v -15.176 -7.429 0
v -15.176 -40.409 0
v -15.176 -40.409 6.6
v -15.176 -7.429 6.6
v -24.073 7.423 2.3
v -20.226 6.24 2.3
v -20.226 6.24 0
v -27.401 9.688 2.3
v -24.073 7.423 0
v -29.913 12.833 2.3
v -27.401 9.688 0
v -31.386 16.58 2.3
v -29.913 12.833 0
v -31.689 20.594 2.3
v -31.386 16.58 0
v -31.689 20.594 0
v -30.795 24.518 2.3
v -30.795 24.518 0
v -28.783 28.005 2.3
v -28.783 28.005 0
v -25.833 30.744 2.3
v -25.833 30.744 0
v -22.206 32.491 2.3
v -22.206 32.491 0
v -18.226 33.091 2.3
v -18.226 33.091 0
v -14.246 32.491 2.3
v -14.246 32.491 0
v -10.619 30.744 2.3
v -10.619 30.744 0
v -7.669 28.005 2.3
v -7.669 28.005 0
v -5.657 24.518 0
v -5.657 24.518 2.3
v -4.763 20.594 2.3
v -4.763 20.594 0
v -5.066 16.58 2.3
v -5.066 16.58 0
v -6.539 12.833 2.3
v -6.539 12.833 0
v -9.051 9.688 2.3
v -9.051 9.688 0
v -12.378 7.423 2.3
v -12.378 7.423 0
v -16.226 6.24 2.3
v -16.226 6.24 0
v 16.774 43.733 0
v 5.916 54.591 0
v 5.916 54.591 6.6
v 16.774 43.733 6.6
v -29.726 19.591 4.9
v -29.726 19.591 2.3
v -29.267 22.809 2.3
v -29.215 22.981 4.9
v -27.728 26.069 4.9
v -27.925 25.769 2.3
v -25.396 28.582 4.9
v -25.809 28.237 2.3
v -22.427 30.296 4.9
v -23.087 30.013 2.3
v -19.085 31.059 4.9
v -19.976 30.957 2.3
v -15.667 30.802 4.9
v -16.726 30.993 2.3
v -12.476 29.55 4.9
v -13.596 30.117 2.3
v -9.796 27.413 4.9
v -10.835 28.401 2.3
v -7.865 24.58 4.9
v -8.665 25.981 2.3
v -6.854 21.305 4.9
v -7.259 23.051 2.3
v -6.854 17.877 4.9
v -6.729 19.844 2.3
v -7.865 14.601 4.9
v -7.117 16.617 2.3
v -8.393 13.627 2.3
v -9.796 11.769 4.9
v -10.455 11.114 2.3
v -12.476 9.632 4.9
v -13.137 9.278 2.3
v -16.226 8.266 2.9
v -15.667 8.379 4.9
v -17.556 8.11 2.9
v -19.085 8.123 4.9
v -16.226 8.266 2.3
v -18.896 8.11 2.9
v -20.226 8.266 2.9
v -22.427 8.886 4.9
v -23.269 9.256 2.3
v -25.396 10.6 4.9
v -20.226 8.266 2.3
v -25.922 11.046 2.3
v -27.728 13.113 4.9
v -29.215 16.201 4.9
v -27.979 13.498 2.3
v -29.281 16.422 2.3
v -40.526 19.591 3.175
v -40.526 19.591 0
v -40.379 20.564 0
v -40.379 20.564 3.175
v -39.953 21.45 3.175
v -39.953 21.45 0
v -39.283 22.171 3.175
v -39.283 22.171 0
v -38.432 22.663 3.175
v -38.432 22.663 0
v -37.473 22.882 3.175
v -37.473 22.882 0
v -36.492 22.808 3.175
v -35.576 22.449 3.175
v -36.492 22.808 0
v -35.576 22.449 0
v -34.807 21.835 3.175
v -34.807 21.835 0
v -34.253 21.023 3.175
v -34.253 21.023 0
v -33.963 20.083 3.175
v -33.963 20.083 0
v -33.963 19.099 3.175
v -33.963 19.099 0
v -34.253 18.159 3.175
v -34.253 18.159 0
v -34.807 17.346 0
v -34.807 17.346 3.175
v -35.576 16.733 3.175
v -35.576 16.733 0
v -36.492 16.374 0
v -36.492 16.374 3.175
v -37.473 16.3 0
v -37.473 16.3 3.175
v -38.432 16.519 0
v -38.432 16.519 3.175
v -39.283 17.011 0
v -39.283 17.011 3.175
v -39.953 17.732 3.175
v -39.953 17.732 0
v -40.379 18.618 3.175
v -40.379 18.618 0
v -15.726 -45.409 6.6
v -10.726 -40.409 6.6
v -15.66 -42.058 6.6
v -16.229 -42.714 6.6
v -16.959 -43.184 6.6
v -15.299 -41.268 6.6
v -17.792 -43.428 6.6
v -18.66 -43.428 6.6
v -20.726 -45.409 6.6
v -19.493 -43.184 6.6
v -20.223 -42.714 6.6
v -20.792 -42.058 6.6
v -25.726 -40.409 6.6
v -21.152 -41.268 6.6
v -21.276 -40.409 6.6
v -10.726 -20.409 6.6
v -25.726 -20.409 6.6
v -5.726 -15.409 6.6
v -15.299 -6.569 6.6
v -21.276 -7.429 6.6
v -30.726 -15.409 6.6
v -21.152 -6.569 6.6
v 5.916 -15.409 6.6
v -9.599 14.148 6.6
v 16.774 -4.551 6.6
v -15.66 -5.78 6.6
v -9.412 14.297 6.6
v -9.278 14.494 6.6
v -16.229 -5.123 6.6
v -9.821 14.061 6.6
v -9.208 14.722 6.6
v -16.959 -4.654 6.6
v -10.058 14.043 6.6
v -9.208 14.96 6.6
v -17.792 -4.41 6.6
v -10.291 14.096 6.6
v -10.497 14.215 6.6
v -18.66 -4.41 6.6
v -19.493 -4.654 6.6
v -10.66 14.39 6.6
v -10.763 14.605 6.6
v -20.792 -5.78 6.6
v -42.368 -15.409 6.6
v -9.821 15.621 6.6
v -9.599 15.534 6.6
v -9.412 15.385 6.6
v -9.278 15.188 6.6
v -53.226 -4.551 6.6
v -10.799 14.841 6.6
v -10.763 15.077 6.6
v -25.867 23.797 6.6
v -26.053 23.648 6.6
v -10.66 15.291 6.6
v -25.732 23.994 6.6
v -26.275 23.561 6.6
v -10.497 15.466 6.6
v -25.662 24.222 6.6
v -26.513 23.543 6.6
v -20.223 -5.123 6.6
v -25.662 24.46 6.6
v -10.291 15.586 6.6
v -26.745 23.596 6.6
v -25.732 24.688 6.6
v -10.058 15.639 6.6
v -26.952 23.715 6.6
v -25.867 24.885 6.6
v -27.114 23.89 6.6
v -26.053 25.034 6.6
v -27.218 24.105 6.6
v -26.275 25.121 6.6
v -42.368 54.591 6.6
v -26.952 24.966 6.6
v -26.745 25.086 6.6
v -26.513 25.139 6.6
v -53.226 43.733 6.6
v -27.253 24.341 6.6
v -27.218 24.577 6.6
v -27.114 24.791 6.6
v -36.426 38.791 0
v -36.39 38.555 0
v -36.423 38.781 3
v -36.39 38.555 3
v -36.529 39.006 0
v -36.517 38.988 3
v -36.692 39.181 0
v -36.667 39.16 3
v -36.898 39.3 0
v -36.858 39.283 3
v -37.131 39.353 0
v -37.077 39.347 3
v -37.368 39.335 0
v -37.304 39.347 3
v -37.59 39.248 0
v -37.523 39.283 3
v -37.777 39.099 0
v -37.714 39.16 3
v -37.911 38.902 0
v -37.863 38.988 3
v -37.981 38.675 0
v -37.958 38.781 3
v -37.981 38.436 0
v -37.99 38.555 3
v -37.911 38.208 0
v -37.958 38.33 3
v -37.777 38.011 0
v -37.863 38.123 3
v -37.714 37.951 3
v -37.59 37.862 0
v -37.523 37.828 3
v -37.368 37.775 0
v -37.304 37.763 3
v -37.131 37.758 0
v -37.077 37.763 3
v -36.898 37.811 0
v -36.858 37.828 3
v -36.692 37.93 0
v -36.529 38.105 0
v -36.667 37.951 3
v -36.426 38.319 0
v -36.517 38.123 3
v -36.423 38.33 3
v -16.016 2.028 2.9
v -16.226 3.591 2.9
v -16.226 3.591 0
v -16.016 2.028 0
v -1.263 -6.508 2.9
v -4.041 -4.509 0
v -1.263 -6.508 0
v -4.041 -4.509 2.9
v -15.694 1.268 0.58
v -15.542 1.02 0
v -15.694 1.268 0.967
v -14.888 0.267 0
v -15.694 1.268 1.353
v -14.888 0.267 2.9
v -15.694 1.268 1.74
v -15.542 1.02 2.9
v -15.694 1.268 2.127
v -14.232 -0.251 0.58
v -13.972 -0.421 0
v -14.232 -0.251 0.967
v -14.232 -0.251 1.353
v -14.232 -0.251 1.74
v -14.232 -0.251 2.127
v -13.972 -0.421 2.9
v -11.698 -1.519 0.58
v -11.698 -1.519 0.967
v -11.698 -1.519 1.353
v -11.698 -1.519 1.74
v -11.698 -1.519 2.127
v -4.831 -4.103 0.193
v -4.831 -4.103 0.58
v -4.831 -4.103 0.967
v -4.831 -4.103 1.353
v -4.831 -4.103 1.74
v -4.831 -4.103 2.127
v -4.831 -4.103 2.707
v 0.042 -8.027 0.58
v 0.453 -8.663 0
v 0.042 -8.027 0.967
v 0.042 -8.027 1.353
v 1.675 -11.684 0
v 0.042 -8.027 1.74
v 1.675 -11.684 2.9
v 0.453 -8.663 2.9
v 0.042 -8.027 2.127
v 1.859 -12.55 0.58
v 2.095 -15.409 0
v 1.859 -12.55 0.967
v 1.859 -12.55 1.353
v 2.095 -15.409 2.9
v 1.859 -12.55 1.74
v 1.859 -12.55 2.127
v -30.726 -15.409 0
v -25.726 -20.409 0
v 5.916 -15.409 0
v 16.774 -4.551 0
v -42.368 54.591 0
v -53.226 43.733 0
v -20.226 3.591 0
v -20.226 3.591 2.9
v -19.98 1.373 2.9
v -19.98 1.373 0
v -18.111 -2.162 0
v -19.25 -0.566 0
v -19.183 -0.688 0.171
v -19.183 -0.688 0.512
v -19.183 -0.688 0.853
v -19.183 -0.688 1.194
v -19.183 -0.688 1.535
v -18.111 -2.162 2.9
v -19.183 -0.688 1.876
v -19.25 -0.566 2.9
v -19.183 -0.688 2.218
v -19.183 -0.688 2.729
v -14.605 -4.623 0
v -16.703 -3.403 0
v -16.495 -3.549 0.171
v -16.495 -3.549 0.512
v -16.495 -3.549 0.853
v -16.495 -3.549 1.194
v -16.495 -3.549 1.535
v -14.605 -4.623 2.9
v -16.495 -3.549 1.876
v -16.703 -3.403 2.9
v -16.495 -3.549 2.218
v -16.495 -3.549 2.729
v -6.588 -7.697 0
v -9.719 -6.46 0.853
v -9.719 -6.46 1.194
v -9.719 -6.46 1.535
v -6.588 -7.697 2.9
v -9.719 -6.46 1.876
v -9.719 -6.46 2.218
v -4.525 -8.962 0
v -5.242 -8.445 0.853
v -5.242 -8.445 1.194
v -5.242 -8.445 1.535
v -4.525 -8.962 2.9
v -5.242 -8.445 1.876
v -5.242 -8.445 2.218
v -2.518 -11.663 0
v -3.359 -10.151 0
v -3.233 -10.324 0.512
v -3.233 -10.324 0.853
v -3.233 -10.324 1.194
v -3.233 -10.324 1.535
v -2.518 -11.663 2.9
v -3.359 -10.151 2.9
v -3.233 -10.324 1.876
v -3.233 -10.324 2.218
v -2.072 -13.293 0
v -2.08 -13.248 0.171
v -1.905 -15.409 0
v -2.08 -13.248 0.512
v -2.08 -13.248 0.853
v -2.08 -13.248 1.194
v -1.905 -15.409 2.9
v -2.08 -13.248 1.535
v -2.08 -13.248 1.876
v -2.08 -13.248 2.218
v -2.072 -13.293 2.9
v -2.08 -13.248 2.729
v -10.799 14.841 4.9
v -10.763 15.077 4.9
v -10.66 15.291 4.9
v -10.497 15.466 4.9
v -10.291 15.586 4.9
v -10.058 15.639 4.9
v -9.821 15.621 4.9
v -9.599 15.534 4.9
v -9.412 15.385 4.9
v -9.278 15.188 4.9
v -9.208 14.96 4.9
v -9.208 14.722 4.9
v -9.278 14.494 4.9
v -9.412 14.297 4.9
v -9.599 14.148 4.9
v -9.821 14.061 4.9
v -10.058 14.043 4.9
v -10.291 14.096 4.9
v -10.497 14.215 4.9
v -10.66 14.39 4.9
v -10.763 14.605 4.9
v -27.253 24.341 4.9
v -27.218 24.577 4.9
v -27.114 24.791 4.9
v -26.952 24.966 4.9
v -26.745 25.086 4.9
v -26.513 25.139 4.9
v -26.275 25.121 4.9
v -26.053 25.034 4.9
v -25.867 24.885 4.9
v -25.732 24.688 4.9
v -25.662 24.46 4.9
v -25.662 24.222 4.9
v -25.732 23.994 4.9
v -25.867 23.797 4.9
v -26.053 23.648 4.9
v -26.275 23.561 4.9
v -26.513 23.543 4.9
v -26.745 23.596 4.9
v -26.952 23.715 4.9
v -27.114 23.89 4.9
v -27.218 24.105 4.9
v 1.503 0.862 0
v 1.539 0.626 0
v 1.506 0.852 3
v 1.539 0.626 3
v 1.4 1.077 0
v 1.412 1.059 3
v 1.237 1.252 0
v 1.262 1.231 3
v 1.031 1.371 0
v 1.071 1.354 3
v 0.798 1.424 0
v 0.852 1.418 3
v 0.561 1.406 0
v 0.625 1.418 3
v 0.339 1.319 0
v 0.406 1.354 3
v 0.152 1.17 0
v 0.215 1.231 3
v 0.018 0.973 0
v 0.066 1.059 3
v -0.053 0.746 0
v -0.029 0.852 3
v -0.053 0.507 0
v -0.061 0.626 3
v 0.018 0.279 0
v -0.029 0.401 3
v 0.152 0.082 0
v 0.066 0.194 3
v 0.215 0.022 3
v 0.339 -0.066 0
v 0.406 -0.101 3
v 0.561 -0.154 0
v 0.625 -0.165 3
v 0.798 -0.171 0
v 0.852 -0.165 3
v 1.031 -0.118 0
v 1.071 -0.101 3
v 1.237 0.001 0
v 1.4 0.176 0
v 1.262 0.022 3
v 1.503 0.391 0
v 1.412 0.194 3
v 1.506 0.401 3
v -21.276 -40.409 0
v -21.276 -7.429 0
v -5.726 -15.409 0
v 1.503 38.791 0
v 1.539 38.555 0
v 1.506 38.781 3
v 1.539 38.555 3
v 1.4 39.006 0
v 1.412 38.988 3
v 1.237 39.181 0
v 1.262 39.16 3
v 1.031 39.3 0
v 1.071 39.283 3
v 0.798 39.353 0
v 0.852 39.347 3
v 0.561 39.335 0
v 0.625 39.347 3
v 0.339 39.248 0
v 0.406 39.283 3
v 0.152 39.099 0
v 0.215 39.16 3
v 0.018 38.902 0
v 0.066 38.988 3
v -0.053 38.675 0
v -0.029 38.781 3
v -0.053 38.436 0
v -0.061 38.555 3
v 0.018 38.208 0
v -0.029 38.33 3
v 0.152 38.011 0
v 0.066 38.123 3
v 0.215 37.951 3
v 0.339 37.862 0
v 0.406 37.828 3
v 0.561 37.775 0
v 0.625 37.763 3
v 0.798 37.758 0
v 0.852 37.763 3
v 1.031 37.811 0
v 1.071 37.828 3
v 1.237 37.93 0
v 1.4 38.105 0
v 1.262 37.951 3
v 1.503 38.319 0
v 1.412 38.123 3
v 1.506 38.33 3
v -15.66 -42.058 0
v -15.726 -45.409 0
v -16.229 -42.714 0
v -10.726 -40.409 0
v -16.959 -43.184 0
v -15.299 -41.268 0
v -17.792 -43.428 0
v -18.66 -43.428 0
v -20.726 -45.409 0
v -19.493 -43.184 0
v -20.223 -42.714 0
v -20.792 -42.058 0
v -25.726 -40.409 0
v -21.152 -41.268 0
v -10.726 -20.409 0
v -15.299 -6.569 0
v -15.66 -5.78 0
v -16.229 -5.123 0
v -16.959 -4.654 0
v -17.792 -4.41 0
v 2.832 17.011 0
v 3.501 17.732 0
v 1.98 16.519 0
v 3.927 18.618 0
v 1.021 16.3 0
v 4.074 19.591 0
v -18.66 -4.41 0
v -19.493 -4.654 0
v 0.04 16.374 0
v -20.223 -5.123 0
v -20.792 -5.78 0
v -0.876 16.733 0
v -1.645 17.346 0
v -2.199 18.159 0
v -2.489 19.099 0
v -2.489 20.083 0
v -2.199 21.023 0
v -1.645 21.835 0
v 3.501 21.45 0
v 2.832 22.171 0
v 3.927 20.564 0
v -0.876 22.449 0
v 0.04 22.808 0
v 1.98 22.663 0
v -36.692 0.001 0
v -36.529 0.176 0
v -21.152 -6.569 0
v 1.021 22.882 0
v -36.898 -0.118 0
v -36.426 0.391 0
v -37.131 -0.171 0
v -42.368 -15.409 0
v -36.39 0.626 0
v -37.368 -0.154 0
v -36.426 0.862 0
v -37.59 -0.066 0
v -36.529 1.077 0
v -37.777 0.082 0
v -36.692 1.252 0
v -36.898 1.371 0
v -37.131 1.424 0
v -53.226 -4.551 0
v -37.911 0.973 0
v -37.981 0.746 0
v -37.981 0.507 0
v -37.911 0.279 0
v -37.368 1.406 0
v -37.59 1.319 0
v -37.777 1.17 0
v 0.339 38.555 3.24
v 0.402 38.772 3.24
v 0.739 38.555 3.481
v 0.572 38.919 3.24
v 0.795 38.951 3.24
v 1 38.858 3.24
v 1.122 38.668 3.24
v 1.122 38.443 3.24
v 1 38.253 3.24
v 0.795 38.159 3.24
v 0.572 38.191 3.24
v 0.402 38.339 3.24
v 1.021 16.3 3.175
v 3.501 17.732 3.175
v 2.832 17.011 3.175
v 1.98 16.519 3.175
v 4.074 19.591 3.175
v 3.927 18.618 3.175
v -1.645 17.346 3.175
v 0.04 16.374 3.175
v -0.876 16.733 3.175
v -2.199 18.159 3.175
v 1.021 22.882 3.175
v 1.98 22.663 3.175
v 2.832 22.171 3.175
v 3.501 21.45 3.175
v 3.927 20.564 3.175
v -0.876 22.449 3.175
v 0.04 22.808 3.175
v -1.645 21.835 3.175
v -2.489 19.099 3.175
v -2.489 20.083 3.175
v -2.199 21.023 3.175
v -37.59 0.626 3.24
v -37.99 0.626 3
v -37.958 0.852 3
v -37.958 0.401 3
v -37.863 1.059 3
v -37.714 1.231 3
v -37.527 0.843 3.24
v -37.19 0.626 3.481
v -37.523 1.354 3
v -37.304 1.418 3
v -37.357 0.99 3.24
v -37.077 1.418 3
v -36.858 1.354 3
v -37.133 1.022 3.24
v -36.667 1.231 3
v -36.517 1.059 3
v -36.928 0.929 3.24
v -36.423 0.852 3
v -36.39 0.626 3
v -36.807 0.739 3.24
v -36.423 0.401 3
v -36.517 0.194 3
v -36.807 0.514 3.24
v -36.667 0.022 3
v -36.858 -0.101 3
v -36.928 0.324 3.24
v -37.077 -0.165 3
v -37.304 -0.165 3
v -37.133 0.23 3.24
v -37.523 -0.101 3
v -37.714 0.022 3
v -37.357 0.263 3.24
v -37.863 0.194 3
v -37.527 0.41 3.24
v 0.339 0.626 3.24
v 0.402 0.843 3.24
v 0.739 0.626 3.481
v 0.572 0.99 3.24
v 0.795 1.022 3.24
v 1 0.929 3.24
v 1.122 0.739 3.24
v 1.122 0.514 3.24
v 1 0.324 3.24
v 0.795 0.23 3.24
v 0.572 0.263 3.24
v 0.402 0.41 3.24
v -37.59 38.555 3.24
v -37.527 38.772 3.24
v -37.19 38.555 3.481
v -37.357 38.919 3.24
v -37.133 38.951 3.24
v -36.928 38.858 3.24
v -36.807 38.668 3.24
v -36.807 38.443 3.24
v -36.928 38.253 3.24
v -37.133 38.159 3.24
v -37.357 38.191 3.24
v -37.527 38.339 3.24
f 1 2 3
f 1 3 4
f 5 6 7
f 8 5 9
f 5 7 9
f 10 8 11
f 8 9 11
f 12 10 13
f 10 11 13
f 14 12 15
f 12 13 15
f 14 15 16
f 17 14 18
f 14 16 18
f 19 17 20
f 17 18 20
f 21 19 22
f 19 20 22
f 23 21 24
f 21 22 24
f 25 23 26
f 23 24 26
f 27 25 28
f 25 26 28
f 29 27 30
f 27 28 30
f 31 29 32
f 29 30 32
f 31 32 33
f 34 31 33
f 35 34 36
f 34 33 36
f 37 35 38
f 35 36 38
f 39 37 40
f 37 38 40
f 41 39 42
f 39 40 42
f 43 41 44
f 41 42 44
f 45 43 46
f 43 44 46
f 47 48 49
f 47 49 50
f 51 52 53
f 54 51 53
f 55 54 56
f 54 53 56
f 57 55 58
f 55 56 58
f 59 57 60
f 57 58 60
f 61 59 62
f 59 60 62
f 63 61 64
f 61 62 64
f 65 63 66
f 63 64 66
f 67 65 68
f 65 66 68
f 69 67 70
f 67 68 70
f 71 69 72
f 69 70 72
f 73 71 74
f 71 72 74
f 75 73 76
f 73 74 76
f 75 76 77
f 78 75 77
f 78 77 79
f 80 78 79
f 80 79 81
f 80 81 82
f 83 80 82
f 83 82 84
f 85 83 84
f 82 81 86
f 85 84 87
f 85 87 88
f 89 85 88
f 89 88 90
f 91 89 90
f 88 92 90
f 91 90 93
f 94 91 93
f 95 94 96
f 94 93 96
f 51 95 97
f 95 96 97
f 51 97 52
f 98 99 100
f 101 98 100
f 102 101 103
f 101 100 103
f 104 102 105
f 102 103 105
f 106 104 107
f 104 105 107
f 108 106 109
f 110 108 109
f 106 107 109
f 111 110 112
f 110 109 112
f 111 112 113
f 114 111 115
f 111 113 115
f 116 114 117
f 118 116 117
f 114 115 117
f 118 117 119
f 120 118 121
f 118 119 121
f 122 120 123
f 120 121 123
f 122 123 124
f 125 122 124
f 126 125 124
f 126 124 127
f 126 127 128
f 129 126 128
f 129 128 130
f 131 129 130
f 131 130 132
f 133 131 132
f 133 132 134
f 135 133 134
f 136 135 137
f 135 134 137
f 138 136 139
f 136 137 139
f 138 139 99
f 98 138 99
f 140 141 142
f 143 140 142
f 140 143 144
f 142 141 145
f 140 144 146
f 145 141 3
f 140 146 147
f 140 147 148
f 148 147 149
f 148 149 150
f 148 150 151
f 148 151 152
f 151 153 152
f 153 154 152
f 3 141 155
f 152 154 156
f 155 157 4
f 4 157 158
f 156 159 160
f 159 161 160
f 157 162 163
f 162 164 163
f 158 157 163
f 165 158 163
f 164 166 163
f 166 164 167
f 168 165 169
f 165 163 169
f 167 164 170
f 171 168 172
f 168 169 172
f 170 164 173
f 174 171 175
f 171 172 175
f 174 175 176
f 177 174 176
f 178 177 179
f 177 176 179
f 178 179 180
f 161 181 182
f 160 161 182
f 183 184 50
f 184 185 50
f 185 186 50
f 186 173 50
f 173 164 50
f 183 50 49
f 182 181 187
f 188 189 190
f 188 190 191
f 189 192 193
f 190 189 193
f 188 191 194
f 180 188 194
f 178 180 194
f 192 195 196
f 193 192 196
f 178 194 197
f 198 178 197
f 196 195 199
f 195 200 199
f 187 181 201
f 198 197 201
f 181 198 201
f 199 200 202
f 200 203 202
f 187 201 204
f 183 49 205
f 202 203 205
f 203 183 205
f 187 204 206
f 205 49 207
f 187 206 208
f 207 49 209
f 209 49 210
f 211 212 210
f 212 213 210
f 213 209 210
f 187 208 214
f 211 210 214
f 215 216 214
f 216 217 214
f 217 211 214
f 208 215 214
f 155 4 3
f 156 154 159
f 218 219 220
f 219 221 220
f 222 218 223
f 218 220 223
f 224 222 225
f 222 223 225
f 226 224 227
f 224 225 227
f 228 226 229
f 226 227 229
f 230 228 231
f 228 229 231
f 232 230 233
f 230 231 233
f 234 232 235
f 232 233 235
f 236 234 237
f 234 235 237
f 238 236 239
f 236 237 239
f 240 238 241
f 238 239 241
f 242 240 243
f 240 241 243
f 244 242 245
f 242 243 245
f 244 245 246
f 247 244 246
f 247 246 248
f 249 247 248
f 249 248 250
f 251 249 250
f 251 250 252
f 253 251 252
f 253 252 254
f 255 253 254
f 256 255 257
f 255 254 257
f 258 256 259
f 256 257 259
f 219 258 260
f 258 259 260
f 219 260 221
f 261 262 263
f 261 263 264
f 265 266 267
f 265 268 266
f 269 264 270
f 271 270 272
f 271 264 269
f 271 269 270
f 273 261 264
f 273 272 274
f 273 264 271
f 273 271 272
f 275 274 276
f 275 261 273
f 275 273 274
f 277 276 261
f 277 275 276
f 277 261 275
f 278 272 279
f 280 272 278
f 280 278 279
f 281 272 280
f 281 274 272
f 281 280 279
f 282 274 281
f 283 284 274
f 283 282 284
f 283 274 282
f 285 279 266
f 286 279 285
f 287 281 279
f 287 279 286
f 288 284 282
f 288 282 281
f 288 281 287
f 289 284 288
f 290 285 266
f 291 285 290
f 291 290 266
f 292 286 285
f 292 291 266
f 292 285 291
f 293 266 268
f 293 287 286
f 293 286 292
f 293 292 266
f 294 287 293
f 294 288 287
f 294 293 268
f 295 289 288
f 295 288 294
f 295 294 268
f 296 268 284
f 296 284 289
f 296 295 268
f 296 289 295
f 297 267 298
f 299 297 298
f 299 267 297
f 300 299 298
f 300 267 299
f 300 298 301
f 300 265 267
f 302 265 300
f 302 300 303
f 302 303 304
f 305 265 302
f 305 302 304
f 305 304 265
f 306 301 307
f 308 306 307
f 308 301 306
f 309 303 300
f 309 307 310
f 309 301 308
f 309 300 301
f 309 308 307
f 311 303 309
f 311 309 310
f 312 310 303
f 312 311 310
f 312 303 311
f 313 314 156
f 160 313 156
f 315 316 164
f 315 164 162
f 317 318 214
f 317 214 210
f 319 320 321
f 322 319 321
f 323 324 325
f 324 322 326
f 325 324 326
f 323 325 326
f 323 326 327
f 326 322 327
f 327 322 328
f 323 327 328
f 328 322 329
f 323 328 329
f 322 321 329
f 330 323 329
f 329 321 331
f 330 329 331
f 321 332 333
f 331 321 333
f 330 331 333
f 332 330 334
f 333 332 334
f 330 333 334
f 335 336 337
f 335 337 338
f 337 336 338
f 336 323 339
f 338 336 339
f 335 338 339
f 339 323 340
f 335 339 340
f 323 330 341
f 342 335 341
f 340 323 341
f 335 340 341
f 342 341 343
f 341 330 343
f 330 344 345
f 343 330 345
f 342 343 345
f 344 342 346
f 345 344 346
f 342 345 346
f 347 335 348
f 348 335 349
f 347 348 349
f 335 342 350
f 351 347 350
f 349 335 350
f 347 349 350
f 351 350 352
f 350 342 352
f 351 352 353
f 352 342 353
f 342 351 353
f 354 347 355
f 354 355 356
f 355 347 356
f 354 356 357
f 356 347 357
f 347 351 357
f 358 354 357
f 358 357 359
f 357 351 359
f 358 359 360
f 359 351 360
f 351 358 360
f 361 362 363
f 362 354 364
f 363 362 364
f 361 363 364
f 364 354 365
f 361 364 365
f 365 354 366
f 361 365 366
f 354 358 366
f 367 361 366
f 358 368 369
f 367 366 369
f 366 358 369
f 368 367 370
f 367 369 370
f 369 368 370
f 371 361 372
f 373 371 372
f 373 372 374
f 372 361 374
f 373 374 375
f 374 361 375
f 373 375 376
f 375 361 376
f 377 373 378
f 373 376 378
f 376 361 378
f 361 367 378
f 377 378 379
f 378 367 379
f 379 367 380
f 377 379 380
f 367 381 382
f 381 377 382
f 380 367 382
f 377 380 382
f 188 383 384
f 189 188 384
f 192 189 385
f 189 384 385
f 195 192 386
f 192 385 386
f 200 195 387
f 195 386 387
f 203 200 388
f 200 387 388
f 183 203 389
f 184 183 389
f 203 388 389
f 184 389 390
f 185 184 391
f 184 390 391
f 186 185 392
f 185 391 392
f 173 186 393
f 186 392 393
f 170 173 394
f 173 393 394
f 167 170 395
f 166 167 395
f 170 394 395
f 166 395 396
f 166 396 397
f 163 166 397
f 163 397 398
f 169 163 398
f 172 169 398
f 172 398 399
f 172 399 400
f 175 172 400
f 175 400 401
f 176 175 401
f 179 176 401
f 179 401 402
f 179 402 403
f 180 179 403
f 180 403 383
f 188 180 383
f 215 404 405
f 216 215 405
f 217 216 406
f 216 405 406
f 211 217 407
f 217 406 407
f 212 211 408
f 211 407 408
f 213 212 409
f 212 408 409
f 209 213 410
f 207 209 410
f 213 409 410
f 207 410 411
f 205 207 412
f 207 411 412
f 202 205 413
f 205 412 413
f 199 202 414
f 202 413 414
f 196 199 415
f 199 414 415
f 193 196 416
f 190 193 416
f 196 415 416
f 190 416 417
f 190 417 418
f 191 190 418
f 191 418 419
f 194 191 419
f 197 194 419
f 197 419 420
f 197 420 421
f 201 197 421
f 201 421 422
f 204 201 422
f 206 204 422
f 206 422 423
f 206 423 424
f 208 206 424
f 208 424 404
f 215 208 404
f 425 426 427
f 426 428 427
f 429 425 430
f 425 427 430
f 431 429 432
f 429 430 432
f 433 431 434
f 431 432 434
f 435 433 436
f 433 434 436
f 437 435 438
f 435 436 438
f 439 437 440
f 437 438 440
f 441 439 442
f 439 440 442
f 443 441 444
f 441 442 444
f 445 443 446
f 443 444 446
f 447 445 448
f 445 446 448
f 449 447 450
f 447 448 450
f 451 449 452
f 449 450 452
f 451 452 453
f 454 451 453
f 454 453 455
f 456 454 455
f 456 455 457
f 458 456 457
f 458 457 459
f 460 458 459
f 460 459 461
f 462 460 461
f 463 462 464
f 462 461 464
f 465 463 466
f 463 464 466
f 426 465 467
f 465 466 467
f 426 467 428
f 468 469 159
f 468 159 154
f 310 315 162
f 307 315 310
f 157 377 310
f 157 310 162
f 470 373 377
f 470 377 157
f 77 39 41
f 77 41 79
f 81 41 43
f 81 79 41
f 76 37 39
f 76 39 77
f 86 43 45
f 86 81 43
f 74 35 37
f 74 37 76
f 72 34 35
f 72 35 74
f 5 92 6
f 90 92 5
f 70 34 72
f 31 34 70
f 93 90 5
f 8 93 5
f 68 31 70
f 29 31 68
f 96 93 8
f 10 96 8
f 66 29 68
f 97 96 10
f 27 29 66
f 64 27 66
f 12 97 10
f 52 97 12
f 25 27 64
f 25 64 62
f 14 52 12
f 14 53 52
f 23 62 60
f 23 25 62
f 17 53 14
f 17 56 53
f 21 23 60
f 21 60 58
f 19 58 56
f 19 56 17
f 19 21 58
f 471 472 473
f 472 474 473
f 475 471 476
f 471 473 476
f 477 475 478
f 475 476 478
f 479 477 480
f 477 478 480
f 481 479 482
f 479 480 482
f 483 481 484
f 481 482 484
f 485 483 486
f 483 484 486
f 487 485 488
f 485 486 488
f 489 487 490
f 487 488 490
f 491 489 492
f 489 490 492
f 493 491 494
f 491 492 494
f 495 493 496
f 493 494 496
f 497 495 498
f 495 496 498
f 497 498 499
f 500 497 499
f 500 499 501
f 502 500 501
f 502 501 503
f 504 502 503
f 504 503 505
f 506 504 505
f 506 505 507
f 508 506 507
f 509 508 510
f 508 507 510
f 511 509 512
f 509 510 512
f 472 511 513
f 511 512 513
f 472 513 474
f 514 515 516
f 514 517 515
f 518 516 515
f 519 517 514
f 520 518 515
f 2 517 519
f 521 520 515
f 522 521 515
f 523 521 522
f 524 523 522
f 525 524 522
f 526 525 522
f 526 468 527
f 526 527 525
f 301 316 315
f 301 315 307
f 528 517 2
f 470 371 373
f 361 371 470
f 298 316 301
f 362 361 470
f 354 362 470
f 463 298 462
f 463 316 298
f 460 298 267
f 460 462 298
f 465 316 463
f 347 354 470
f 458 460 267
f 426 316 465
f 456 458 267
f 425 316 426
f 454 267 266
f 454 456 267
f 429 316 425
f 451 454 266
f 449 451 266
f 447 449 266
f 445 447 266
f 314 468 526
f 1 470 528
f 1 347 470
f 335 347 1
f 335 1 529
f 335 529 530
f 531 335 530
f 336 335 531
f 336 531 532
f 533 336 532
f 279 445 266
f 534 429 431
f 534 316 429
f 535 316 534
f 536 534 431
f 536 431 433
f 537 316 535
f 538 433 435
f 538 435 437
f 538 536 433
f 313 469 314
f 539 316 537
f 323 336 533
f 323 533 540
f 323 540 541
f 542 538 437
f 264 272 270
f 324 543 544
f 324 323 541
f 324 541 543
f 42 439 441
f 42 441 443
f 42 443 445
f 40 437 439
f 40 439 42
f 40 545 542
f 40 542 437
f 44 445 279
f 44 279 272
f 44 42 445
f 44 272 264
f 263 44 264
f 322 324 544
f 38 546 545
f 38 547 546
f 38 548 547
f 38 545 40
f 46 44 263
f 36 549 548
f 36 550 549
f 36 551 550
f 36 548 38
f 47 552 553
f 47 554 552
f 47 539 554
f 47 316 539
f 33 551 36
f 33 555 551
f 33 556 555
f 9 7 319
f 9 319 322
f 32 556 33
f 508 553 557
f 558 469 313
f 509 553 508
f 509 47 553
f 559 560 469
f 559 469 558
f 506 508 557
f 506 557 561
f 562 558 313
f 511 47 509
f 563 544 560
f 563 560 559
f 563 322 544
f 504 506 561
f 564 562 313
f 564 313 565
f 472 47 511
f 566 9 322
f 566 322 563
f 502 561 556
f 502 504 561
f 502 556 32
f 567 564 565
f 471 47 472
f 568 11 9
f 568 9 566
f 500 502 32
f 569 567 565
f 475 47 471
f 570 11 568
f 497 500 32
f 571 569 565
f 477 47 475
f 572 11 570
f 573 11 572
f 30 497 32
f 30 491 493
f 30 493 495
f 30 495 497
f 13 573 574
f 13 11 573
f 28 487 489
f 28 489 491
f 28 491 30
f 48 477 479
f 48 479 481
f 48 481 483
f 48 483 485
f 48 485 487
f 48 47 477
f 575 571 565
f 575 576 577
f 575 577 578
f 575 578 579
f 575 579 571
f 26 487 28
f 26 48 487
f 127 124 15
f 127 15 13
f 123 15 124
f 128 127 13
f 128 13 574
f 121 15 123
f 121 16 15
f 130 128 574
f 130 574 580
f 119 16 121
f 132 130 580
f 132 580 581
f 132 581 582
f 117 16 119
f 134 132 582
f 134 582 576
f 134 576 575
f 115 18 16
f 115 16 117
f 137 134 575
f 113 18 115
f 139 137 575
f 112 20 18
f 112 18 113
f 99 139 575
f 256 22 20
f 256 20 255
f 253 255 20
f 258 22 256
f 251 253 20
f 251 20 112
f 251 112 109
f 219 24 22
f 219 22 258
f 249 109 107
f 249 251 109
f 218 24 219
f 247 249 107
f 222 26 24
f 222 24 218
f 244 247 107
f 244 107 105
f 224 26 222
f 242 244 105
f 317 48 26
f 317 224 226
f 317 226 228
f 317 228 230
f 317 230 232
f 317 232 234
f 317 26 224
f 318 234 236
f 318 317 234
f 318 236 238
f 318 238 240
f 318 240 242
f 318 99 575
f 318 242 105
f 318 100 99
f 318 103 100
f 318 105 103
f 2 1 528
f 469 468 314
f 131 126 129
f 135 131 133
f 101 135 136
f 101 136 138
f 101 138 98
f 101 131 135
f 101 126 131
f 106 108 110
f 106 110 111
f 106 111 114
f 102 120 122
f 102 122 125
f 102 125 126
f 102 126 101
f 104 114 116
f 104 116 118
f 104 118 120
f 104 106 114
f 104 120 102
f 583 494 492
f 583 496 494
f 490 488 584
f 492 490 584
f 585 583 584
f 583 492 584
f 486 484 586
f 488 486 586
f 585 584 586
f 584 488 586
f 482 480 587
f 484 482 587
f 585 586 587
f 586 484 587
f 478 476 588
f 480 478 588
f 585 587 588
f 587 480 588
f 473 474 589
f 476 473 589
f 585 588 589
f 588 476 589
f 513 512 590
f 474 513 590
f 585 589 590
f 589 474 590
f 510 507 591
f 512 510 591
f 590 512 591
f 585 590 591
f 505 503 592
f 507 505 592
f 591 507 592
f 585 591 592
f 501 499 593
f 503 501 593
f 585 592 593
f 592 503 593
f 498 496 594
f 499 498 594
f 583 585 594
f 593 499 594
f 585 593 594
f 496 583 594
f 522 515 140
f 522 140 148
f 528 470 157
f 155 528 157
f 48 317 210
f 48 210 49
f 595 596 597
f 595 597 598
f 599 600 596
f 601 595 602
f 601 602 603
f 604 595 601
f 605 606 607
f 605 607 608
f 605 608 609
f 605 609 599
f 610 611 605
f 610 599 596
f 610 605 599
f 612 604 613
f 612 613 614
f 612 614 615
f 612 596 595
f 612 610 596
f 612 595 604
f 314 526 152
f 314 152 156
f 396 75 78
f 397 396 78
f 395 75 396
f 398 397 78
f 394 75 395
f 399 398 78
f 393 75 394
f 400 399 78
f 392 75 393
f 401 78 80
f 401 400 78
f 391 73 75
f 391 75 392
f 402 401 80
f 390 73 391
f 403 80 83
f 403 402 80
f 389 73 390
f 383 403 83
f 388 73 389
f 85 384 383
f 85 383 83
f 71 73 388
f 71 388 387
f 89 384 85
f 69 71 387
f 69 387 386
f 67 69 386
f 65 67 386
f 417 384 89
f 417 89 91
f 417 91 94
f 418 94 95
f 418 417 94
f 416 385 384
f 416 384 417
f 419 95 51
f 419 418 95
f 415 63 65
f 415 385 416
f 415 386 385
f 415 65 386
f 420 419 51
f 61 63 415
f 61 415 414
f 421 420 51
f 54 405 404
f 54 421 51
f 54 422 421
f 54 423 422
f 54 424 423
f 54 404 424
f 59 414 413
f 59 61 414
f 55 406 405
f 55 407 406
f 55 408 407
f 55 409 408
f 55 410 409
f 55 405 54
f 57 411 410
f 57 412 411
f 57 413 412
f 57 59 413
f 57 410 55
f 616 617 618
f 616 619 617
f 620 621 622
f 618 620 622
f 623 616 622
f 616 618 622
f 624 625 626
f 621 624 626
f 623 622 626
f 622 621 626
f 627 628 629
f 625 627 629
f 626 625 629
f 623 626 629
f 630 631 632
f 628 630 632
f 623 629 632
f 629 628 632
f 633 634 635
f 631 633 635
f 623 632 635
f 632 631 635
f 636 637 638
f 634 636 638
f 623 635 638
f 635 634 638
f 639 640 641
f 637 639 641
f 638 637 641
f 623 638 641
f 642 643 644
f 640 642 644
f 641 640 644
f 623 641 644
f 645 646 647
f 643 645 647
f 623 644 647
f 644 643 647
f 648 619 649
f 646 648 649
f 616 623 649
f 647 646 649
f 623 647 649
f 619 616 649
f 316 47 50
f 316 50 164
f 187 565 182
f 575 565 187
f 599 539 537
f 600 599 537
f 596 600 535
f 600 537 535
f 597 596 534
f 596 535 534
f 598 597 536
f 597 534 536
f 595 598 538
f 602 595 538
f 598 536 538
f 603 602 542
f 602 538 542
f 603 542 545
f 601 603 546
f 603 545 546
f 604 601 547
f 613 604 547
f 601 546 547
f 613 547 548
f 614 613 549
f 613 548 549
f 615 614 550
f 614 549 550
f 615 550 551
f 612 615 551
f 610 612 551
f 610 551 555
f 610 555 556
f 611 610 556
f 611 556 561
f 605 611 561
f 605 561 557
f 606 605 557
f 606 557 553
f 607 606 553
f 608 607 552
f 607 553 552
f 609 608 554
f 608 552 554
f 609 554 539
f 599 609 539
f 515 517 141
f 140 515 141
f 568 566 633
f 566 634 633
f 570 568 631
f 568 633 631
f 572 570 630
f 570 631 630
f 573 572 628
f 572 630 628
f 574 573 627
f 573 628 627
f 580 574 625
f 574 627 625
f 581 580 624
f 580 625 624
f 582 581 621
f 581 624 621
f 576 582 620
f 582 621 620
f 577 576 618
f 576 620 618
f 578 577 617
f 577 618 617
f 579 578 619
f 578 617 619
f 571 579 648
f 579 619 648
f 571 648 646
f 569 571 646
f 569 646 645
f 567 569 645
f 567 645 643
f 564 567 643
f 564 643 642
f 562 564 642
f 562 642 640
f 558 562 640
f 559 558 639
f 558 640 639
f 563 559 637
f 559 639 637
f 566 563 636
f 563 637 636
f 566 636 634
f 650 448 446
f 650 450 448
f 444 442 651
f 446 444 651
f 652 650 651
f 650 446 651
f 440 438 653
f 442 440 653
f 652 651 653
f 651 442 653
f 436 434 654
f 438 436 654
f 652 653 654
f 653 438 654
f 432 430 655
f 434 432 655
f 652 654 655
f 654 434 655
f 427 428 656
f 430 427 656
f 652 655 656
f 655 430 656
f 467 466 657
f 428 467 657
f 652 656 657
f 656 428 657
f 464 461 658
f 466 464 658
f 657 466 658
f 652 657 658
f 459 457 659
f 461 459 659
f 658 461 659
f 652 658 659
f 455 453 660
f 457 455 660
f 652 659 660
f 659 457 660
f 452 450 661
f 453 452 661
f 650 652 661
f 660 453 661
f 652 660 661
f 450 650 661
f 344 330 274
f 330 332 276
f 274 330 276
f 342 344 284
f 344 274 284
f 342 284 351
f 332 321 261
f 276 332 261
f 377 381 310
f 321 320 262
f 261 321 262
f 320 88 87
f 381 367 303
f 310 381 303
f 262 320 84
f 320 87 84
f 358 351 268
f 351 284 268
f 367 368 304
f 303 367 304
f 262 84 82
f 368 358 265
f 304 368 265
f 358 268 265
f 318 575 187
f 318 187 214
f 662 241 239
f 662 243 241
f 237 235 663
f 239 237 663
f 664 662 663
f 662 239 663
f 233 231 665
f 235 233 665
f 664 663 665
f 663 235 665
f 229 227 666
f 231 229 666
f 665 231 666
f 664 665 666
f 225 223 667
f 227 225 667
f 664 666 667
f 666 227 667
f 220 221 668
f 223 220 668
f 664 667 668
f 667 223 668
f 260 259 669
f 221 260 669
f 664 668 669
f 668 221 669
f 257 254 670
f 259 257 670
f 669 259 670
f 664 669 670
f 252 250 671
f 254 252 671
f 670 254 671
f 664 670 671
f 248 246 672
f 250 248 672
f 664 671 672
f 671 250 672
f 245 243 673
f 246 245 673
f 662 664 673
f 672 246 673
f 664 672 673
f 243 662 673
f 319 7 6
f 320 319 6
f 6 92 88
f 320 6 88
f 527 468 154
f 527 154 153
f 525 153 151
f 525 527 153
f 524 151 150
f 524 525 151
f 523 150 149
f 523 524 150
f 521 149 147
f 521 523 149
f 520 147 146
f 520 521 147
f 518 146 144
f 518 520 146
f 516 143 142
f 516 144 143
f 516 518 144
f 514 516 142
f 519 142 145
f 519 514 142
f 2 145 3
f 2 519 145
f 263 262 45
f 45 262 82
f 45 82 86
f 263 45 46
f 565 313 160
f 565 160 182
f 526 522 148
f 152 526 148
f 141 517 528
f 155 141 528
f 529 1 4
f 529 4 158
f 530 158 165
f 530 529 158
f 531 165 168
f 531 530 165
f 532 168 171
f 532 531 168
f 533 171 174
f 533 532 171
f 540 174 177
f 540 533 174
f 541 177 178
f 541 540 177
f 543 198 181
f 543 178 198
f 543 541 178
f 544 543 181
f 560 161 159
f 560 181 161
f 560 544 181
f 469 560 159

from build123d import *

# Parameters (mm, degrees)
BOSS_EXTRUDE1_DEPTH             = 6.6
SKETCH4_R                       = 11.5
CUT_EXTRUDE2_DEPTH              = 4.9
SKETCH5_R                       = 13.5
SKETCH5_R_2                     = 11.5
CUT_EXTRUDE3_DEPTH              = 2.3
SKETCH12_R                      = 0.8
CUT_EXTRUDE5_DEPTH              = 63.296330123
CUT_EXTRUDE6_DEPTH              = 10
CUT_EXTRUDE7_REACH              = 68.423
SKETCH18_W                      = 2
SKETCH18_H                      = 2.9
SKETCH19_W                      = 5.7
SKETCH19_H                      = 5
CUT_EXTRUDE8_DEPTH              = 9
CUT_EXTRUDE9_DEPTH              = 3.175
BOSS_EXTRUDE2_DEPTH             = 6.6
BOSS_EXTRUDE3_DEPTH             = 10.5
TAP_DRILL_FOR_M2X0_4_TAP1_D     = 1.6
TAP_DRILL_FOR_M2X0_4_TAP1_DEPTH = 3
TAP_DRILL_FOR_M2X0_4_TAP1_TIP   = 0.480688495
SKETCH27_W                      = 15
SKETCH27_H                      = 30
BOSS_EXTRUDE4_DEPTH             = 6.6
SKETCH28_W                      = 15
SKETCH28_H                      = 19
BOSS_EXTRUDE5_DEPTH             = 6.6
CUT_EXTRUDE11_DEPTH             = 77.52919612
CHAMFER1_SIZE                   = 5
CUT_EXTRUDE12_START             = -2.9
CUT_EXTRUDE12_DEPTH             = 2.9


# Read off the part's stored shape, not the designer's step: Cut-Extrude12
with BuildPart() as part:
    # Sketch2 → Boss-Extrude1 (new body)
    with BuildSketch(Plane.XY):
        with BuildLine():
            Line((-38.225931781, 44.590823815), (1.774068219, 44.590823815))
            ThreePointArc((1.774068219, 44.590823815), (5.309602125, 43.126357721), (6.774068219, 39.590823815))
            Line((6.774068219, 39.590823815), (6.774068219, -0.409176185))
            ThreePointArc((6.774068219, -0.409176185), (5.309602125, -3.944710091), (1.774068219, -5.409176185))
            Line((1.774068219, -5.409176185), (-38.225931781, -5.409176185))
            ThreePointArc((-38.225931781, -5.409176185), (-41.761465687, -3.944710091), (-43.225931781, -0.409176185))
            Line((-43.225931781, -0.409176185), (-43.225931781, 39.590823815))
            ThreePointArc((-43.225931781, 39.590823815), (-41.761465687, 43.126357721), (-38.225931781, 44.590823815))
        make_face()
    extrude(amount=BOSS_EXTRUDE1_DEPTH)

    # Sketch4 → Cut-Extrude2 (cut)
    with BuildSketch(Plane(origin=(0, 0, 0), x_dir=(-1, 0, 0), z_dir=(0, 0, -1))):
        with Locations((18.225931781, 19.590823815)):
            Circle(SKETCH4_R)
    extrude(amount=-CUT_EXTRUDE2_DEPTH, mode=Mode.SUBTRACT)

    # Sketch5 → Cut-Extrude3 (cut)
    with BuildSketch(Plane(origin=(0, 0, 0), x_dir=(-1, 0, 0), z_dir=(0, 0, -1))):
        with Locations((18.225931781, 19.590823815)):
            Circle(SKETCH5_R)
        with Locations((18.225931781, 19.590823815)):
            Circle(SKETCH5_R_2, mode=Mode.SUBTRACT)
    extrude(amount=-CUT_EXTRUDE3_DEPTH, mode=Mode.SUBTRACT)

    # Sketch12 → Cut-Extrude5 (cut, through all)
    with BuildSketch(Plane(origin=(0, 0, 4.9), x_dir=(-1, 0, 0), z_dir=(0, 0, -1))):
        with Locations((26.453173117, 24.340823815)):
            Circle(SKETCH12_R)
        with Locations((9.998690445, 14.840823815)):
            Circle(SKETCH12_R)
    extrude(amount=-CUT_EXTRUDE5_DEPTH, mode=Mode.SUBTRACT)

    # Sketch13 → Cut-Extrude6 (cut)
    with BuildSketch(Plane(origin=(0, 0, 0), x_dir=(-1, 0, 0), z_dir=(0, 0, -1))):
        with BuildLine():
            Line((-6.774068219, 39.590823815), (-1.774068219, 44.590823815))
            ThreePointArc((-1.774068219, 44.590823815), (-5.309602125, 43.126357721), (-6.774068219, 39.590823815))
        make_face()
        with BuildLine():
            Line((-6.774068219, -0.409176185), (-1.774068219, -5.409176185))
            ThreePointArc((-1.774068219, -5.409176185), (-5.309602125, -3.944710091), (-6.774068219, -0.409176185))
        make_face()
        with BuildLine():
            Line((43.225931781, -0.409176185), (38.225931781, -5.409176185))
            ThreePointArc((38.225931781, -5.409176185), (41.761465687, -3.944710091), (43.225931781, -0.409176185))
        make_face()
        with BuildLine():
            Line((38.225931781, 44.590823815), (43.225931781, 39.590823815))
            ThreePointArc((43.225931781, 39.590823815), (41.761465687, 43.126357721), (38.225931781, 44.590823815))
        make_face()
    extrude(amount=-CUT_EXTRUDE6_DEPTH, mode=Mode.SUBTRACT)

    # Sketch18 → Cut-Extrude7 (cut, up to next)
    with BuildSketch(Plane.XZ.offset(5.409176185), mode=Mode.PRIVATE) as cut_extrude7_sk1:
        with Locations((-17.225931781, 1.45)):
            Rectangle(SKETCH18_W, SKETCH18_H)
    cut_extrude7_tool1 = extrude(cut_extrude7_sk1.sketch, amount=-CUT_EXTRUDE7_REACH, mode=Mode.PRIVATE) & part.part
    # Sketch18 → Cut-Extrude7 (cut, up to next)
    with BuildSketch(Plane.XZ.offset(5.409176185), mode=Mode.PRIVATE) as cut_extrude7_sk2:
        with Locations((-19.225931781, 1.45)):
            Rectangle(SKETCH18_W, SKETCH18_H)
    cut_extrude7_tool2 = extrude(cut_extrude7_sk2.sketch, amount=-CUT_EXTRUDE7_REACH, mode=Mode.PRIVATE) & part.part
    add(cut_extrude7_tool1.solids().sort_by_distance((-17.225932, -5.409176, 1.45))[0], mode=Mode.SUBTRACT)
    add(cut_extrude7_tool2.solids().sort_by_distance((-19.225932, -5.409176, 1.45))[0], mode=Mode.SUBTRACT)

    # Sketch19 → Cut-Extrude8 (cut)
    with BuildSketch(Plane.XZ.offset(5.409176185)):
        with Locations((-18.225931781, 2.5)):
            Rectangle(SKETCH19_W, SKETCH19_H)
    extrude(amount=-CUT_EXTRUDE8_DEPTH, mode=Mode.SUBTRACT)

    # Sketch20 → Cut-Extrude9 (cut)
    with BuildSketch(Plane(origin=(0, 0, 0), x_dir=(-1, 0, 0), z_dir=(0, 0, -1))):
        with BuildLine():
            ThreePointArc((2.525931781, 19.590823815), (-0.774068219, 22.890823815), (-4.074068219, 19.590823815))
            Line((-4.074068219, 19.590823815), (-0.774068219, 19.590823815))
            Line((-0.774068219, 19.590823815), (2.525931781, 19.590823815))
        make_face()
        with BuildLine():
            Line((-0.774068219, 19.590823815), (-4.074068219, 19.590823815))
            ThreePointArc((-4.074068219, 19.590823815), (-0.774068219, 16.290823815), (2.525931781, 19.590823815))
            Line((2.525931781, 19.590823815), (-0.774068219, 19.590823815))
        make_face()
        with BuildLine():
            ThreePointArc((33.925931781, 19.590823815), (37.225931781, 16.290823815), (40.525931781, 19.590823815))
            Line((40.525931781, 19.590823815), (37.225931781, 19.590823815))
            Line((37.225931781, 19.590823815), (33.925931781, 19.590823815))
        make_face()
        with BuildLine():
            Line((37.225931781, 19.590823815), (40.525931781, 19.590823815))
            ThreePointArc((40.525931781, 19.590823815), (37.225931781, 22.890823815), (33.925931781, 19.590823815))
            Line((33.925931781, 19.590823815), (37.225931781, 19.590823815))
        make_face()
    extrude(amount=-CUT_EXTRUDE9_DEPTH, mode=Mode.SUBTRACT)

    # Sketch21 → Boss-Extrude2 (add)
    with BuildSketch(Plane(origin=(0, 0, 0), x_dir=(-1, 0, 0), z_dir=(0, 0, -1))):
        with BuildLine():
            Line((15.375931781, -5.409176185), (-1.774068219, -5.409176185))
            Line((-1.774068219, -5.409176185), (-6.774068219, -0.409176185))
            Line((-6.774068219, -0.409176185), (-6.774068219, 39.590823815))
            Line((-6.774068219, 39.590823815), (-1.774068219, 44.590823815))
            Line((-1.774068219, 44.590823815), (38.225931781, 44.590823815))
            Line((38.225931781, 44.590823815), (43.225931781, 39.590823815))
            Line((43.225931781, 39.590823815), (43.225931781, -0.409176185))
            Line((43.225931781, -0.409176185), (38.225931781, -5.409176185))
            Line((38.225931781, -5.409176185), (21.075931781, -5.409176185))
            Line((21.075931781, -5.409176185), (21.075931781, -14.409176185))
            ThreePointArc((21.075931781, -14.409176185), (21.368825, -15.116282966), (22.075931781, -15.409176185))
            Line((22.075931781, -15.409176185), (42.368067404, -15.409176185))
            Line((42.368067404, -15.409176185), (53.225931781, -4.551311808))
            Line((53.225931781, -4.551311808), (53.225931781, 43.732959439))
            Line((53.225931781, 43.732959439), (42.368067404, 54.590823815))
            Line((42.368067404, 54.590823815), (-5.916203843, 54.590823815))
            Line((-5.916203843, 54.590823815), (-16.774068219, 43.732959439))
            Line((-16.774068219, 43.732959439), (-16.774068219, -4.551311808))
            Line((-16.774068219, -4.551311808), (-5.916203843, -15.409176185))
            Line((-5.916203843, -15.409176185), (14.375931781, -15.409176185))
            ThreePointArc((14.375931781, -15.409176185), (15.083038562, -15.116282966), (15.375931781, -14.409176185))
            Line((15.375931781, -14.409176185), (15.375931781, -5.409176185))
        make_face()
    extrude(amount=-BOSS_EXTRUDE2_DEPTH)

    # Sketch23 → Boss-Extrude3 (add)
    with BuildSketch(Plane.XZ.offset(-3.590823815)):
        Polygon((-15.375931781, 5), (-21.075931781, 5), (-21.075931781, 0), (-20.225931781, 0), (-20.225931781, 2.9), (-16.225931781, 2.9), (-16.225931781, 0), (-15.375931781, 0), align=None)
    extrude(amount=BOSS_EXTRUDE3_DEPTH)

    # Tap Drill for M2x0.4 Tap1
    with Locations(Plane(origin=(0.738534313, 0.626357721, 0), x_dir=(-1, 0, 0), z_dir=(0, 0, -1))):
        with Locations((0, 0), (0, 37.928932188), (37.928932188, 0), (37.928932188, 37.928932188)):
            Hole(TAP_DRILL_FOR_M2X0_4_TAP1_D / 2, depth=TAP_DRILL_FOR_M2X0_4_TAP1_DEPTH)
            with Locations((0, 0, -(TAP_DRILL_FOR_M2X0_4_TAP1_DEPTH + TAP_DRILL_FOR_M2X0_4_TAP1_TIP / 2))):  # 118° drill point
                Cone(0, TAP_DRILL_FOR_M2X0_4_TAP1_D / 2, TAP_DRILL_FOR_M2X0_4_TAP1_TIP, mode=Mode.SUBTRACT)

    # Sketch27 → Boss-Extrude4 (add)
    with BuildSketch(Plane(origin=(0, 0, 0), x_dir=(-1, 0, 0), z_dir=(0, 0, -1))):
        with Locations((18.225931781, -30.409176185)):
            Rectangle(SKETCH27_W, SKETCH27_H)
    extrude(amount=-BOSS_EXTRUDE4_DEPTH)

    # Sketch28 → Boss-Extrude5 (add)
    with BuildSketch(Plane(origin=(0, 0, 0), x_dir=(-1, 0, 0), z_dir=(0, 0, -1))):
        with Locations((18.225931781, -5.909176185)):
            Rectangle(SKETCH28_W, SKETCH28_H)
    extrude(amount=-BOSS_EXTRUDE5_DEPTH)

    # Sketch29 → Cut-Extrude11 (cut, through all)
    with BuildSketch(Plane(origin=(0, 0, 0), x_dir=(-1, 0, 0), z_dir=(0, 0, -1))):
        with BuildLine():
            Line((15.175931781, -40.409176185), (15.175931781, -7.428532511))
            ThreePointArc((15.175931781, -7.428532511), (18.225931781, -4.378532511), (21.275931781, -7.428532511))
            Line((21.275931781, -7.428532511), (21.275931781, -40.409176185))
            ThreePointArc((21.275931781, -40.409176185), (18.225931781, -43.459176185), (15.175931781, -40.409176185))
        make_face()
    extrude(amount=-CUT_EXTRUDE11_DEPTH, mode=Mode.SUBTRACT)

    # Chamfer1
    chamfer1_edges = [part.edges().sort_by_distance(p)[0] for p in [
        (-25.725931781, -15.409176185, 3.3),
        (-25.725931781, -45.409176185, 3.3),
        (-10.725931781, -45.409176185, 3.3),
        (-10.725931781, -15.409176185, 3.3),
    ]]
    chamfer(chamfer1_edges, length=CHAMFER1_SIZE)

    # Cut-Extrude12 outline → Cut-Extrude12 (cut)
    with BuildSketch(Plane(origin=(0, 0, 0), x_dir=(-1, 0, 0), z_dir=(0, 0, -1)).offset(CUT_EXTRUDE12_START)):
        with BuildLine():
            add(Edge.make_bspline(
                [(20.225931781, 3.590823815), (20.225931781, 3.197350565), (20.182324291, 2.396395622), (19.919073848, 0.921152326), (19.256804009, -0.752947143), (18.020202718, -2.371752636), (16.0157657, -4.007478883), (13.175437439, -5.314382158), (9.671845103, -6.45103665), (6.987103918, -7.443607584), (5.205242074, -8.425581774), (4.089906326, -9.278706893), (3.199613192, -10.284190015), (2.624756347, -11.322907692), (2.27128167, -12.346173133), (2.067968688, -13.226247217), (1.958515289, -14.069133971), (1.912800936, -14.807256698), (1.904863969, -15.21142357), (1.904863969, -15.409176185)],
                knots=[0, 0, 0, 0, 0.03125, 0.0625, 0.125, 0.1875, 0.25, 0.375, 0.5, 0.625, 0.6875, 0.75, 0.8125, 0.875, 0.90625, 0.9375, 0.96875, 0.984375, 1, 1, 1, 1], degree=3))
            Line((20.225931781, 3.590823815), (16.225931781, 3.590823815))
            add(Edge.make_bspline(
                [(16.225931781, 3.590823815), (16.225931781, 3.349695771), (16.197971207, 2.841833913), (16.049721647, 2.039591017), (15.72788709, 1.23822648), (15.139797291, 0.457977067), (14.280464012, -0.260475455), (13.130188953, -0.920694884), (11.263091636, -1.726327354), (8.458607531, -2.642136424), (4.813382385, -3.965993877), (1.865762572, -5.756214715), (-0.098104505, -7.958715934), (-1.233002962, -10.023055027), (-1.819039575, -12.079797564), (-2.055309799, -13.903240173), (-2.095136031, -14.915149533), (-2.095136031, -15.409176185)],
                knots=[0, 0, 0, 0, 0.03125, 0.0625, 0.125, 0.1875, 0.25, 0.3125, 0.375, 0.5, 0.625, 0.75, 0.8125, 0.875, 0.9375, 0.96875, 1, 1, 1, 1], degree=3))
            Line((-2.095136031, -15.409176185), (1.904863969, -15.409176185))
        make_face()
    extrude(amount=CUT_EXTRUDE12_DEPTH, mode=Mode.SUBTRACT)


solid = part.part
